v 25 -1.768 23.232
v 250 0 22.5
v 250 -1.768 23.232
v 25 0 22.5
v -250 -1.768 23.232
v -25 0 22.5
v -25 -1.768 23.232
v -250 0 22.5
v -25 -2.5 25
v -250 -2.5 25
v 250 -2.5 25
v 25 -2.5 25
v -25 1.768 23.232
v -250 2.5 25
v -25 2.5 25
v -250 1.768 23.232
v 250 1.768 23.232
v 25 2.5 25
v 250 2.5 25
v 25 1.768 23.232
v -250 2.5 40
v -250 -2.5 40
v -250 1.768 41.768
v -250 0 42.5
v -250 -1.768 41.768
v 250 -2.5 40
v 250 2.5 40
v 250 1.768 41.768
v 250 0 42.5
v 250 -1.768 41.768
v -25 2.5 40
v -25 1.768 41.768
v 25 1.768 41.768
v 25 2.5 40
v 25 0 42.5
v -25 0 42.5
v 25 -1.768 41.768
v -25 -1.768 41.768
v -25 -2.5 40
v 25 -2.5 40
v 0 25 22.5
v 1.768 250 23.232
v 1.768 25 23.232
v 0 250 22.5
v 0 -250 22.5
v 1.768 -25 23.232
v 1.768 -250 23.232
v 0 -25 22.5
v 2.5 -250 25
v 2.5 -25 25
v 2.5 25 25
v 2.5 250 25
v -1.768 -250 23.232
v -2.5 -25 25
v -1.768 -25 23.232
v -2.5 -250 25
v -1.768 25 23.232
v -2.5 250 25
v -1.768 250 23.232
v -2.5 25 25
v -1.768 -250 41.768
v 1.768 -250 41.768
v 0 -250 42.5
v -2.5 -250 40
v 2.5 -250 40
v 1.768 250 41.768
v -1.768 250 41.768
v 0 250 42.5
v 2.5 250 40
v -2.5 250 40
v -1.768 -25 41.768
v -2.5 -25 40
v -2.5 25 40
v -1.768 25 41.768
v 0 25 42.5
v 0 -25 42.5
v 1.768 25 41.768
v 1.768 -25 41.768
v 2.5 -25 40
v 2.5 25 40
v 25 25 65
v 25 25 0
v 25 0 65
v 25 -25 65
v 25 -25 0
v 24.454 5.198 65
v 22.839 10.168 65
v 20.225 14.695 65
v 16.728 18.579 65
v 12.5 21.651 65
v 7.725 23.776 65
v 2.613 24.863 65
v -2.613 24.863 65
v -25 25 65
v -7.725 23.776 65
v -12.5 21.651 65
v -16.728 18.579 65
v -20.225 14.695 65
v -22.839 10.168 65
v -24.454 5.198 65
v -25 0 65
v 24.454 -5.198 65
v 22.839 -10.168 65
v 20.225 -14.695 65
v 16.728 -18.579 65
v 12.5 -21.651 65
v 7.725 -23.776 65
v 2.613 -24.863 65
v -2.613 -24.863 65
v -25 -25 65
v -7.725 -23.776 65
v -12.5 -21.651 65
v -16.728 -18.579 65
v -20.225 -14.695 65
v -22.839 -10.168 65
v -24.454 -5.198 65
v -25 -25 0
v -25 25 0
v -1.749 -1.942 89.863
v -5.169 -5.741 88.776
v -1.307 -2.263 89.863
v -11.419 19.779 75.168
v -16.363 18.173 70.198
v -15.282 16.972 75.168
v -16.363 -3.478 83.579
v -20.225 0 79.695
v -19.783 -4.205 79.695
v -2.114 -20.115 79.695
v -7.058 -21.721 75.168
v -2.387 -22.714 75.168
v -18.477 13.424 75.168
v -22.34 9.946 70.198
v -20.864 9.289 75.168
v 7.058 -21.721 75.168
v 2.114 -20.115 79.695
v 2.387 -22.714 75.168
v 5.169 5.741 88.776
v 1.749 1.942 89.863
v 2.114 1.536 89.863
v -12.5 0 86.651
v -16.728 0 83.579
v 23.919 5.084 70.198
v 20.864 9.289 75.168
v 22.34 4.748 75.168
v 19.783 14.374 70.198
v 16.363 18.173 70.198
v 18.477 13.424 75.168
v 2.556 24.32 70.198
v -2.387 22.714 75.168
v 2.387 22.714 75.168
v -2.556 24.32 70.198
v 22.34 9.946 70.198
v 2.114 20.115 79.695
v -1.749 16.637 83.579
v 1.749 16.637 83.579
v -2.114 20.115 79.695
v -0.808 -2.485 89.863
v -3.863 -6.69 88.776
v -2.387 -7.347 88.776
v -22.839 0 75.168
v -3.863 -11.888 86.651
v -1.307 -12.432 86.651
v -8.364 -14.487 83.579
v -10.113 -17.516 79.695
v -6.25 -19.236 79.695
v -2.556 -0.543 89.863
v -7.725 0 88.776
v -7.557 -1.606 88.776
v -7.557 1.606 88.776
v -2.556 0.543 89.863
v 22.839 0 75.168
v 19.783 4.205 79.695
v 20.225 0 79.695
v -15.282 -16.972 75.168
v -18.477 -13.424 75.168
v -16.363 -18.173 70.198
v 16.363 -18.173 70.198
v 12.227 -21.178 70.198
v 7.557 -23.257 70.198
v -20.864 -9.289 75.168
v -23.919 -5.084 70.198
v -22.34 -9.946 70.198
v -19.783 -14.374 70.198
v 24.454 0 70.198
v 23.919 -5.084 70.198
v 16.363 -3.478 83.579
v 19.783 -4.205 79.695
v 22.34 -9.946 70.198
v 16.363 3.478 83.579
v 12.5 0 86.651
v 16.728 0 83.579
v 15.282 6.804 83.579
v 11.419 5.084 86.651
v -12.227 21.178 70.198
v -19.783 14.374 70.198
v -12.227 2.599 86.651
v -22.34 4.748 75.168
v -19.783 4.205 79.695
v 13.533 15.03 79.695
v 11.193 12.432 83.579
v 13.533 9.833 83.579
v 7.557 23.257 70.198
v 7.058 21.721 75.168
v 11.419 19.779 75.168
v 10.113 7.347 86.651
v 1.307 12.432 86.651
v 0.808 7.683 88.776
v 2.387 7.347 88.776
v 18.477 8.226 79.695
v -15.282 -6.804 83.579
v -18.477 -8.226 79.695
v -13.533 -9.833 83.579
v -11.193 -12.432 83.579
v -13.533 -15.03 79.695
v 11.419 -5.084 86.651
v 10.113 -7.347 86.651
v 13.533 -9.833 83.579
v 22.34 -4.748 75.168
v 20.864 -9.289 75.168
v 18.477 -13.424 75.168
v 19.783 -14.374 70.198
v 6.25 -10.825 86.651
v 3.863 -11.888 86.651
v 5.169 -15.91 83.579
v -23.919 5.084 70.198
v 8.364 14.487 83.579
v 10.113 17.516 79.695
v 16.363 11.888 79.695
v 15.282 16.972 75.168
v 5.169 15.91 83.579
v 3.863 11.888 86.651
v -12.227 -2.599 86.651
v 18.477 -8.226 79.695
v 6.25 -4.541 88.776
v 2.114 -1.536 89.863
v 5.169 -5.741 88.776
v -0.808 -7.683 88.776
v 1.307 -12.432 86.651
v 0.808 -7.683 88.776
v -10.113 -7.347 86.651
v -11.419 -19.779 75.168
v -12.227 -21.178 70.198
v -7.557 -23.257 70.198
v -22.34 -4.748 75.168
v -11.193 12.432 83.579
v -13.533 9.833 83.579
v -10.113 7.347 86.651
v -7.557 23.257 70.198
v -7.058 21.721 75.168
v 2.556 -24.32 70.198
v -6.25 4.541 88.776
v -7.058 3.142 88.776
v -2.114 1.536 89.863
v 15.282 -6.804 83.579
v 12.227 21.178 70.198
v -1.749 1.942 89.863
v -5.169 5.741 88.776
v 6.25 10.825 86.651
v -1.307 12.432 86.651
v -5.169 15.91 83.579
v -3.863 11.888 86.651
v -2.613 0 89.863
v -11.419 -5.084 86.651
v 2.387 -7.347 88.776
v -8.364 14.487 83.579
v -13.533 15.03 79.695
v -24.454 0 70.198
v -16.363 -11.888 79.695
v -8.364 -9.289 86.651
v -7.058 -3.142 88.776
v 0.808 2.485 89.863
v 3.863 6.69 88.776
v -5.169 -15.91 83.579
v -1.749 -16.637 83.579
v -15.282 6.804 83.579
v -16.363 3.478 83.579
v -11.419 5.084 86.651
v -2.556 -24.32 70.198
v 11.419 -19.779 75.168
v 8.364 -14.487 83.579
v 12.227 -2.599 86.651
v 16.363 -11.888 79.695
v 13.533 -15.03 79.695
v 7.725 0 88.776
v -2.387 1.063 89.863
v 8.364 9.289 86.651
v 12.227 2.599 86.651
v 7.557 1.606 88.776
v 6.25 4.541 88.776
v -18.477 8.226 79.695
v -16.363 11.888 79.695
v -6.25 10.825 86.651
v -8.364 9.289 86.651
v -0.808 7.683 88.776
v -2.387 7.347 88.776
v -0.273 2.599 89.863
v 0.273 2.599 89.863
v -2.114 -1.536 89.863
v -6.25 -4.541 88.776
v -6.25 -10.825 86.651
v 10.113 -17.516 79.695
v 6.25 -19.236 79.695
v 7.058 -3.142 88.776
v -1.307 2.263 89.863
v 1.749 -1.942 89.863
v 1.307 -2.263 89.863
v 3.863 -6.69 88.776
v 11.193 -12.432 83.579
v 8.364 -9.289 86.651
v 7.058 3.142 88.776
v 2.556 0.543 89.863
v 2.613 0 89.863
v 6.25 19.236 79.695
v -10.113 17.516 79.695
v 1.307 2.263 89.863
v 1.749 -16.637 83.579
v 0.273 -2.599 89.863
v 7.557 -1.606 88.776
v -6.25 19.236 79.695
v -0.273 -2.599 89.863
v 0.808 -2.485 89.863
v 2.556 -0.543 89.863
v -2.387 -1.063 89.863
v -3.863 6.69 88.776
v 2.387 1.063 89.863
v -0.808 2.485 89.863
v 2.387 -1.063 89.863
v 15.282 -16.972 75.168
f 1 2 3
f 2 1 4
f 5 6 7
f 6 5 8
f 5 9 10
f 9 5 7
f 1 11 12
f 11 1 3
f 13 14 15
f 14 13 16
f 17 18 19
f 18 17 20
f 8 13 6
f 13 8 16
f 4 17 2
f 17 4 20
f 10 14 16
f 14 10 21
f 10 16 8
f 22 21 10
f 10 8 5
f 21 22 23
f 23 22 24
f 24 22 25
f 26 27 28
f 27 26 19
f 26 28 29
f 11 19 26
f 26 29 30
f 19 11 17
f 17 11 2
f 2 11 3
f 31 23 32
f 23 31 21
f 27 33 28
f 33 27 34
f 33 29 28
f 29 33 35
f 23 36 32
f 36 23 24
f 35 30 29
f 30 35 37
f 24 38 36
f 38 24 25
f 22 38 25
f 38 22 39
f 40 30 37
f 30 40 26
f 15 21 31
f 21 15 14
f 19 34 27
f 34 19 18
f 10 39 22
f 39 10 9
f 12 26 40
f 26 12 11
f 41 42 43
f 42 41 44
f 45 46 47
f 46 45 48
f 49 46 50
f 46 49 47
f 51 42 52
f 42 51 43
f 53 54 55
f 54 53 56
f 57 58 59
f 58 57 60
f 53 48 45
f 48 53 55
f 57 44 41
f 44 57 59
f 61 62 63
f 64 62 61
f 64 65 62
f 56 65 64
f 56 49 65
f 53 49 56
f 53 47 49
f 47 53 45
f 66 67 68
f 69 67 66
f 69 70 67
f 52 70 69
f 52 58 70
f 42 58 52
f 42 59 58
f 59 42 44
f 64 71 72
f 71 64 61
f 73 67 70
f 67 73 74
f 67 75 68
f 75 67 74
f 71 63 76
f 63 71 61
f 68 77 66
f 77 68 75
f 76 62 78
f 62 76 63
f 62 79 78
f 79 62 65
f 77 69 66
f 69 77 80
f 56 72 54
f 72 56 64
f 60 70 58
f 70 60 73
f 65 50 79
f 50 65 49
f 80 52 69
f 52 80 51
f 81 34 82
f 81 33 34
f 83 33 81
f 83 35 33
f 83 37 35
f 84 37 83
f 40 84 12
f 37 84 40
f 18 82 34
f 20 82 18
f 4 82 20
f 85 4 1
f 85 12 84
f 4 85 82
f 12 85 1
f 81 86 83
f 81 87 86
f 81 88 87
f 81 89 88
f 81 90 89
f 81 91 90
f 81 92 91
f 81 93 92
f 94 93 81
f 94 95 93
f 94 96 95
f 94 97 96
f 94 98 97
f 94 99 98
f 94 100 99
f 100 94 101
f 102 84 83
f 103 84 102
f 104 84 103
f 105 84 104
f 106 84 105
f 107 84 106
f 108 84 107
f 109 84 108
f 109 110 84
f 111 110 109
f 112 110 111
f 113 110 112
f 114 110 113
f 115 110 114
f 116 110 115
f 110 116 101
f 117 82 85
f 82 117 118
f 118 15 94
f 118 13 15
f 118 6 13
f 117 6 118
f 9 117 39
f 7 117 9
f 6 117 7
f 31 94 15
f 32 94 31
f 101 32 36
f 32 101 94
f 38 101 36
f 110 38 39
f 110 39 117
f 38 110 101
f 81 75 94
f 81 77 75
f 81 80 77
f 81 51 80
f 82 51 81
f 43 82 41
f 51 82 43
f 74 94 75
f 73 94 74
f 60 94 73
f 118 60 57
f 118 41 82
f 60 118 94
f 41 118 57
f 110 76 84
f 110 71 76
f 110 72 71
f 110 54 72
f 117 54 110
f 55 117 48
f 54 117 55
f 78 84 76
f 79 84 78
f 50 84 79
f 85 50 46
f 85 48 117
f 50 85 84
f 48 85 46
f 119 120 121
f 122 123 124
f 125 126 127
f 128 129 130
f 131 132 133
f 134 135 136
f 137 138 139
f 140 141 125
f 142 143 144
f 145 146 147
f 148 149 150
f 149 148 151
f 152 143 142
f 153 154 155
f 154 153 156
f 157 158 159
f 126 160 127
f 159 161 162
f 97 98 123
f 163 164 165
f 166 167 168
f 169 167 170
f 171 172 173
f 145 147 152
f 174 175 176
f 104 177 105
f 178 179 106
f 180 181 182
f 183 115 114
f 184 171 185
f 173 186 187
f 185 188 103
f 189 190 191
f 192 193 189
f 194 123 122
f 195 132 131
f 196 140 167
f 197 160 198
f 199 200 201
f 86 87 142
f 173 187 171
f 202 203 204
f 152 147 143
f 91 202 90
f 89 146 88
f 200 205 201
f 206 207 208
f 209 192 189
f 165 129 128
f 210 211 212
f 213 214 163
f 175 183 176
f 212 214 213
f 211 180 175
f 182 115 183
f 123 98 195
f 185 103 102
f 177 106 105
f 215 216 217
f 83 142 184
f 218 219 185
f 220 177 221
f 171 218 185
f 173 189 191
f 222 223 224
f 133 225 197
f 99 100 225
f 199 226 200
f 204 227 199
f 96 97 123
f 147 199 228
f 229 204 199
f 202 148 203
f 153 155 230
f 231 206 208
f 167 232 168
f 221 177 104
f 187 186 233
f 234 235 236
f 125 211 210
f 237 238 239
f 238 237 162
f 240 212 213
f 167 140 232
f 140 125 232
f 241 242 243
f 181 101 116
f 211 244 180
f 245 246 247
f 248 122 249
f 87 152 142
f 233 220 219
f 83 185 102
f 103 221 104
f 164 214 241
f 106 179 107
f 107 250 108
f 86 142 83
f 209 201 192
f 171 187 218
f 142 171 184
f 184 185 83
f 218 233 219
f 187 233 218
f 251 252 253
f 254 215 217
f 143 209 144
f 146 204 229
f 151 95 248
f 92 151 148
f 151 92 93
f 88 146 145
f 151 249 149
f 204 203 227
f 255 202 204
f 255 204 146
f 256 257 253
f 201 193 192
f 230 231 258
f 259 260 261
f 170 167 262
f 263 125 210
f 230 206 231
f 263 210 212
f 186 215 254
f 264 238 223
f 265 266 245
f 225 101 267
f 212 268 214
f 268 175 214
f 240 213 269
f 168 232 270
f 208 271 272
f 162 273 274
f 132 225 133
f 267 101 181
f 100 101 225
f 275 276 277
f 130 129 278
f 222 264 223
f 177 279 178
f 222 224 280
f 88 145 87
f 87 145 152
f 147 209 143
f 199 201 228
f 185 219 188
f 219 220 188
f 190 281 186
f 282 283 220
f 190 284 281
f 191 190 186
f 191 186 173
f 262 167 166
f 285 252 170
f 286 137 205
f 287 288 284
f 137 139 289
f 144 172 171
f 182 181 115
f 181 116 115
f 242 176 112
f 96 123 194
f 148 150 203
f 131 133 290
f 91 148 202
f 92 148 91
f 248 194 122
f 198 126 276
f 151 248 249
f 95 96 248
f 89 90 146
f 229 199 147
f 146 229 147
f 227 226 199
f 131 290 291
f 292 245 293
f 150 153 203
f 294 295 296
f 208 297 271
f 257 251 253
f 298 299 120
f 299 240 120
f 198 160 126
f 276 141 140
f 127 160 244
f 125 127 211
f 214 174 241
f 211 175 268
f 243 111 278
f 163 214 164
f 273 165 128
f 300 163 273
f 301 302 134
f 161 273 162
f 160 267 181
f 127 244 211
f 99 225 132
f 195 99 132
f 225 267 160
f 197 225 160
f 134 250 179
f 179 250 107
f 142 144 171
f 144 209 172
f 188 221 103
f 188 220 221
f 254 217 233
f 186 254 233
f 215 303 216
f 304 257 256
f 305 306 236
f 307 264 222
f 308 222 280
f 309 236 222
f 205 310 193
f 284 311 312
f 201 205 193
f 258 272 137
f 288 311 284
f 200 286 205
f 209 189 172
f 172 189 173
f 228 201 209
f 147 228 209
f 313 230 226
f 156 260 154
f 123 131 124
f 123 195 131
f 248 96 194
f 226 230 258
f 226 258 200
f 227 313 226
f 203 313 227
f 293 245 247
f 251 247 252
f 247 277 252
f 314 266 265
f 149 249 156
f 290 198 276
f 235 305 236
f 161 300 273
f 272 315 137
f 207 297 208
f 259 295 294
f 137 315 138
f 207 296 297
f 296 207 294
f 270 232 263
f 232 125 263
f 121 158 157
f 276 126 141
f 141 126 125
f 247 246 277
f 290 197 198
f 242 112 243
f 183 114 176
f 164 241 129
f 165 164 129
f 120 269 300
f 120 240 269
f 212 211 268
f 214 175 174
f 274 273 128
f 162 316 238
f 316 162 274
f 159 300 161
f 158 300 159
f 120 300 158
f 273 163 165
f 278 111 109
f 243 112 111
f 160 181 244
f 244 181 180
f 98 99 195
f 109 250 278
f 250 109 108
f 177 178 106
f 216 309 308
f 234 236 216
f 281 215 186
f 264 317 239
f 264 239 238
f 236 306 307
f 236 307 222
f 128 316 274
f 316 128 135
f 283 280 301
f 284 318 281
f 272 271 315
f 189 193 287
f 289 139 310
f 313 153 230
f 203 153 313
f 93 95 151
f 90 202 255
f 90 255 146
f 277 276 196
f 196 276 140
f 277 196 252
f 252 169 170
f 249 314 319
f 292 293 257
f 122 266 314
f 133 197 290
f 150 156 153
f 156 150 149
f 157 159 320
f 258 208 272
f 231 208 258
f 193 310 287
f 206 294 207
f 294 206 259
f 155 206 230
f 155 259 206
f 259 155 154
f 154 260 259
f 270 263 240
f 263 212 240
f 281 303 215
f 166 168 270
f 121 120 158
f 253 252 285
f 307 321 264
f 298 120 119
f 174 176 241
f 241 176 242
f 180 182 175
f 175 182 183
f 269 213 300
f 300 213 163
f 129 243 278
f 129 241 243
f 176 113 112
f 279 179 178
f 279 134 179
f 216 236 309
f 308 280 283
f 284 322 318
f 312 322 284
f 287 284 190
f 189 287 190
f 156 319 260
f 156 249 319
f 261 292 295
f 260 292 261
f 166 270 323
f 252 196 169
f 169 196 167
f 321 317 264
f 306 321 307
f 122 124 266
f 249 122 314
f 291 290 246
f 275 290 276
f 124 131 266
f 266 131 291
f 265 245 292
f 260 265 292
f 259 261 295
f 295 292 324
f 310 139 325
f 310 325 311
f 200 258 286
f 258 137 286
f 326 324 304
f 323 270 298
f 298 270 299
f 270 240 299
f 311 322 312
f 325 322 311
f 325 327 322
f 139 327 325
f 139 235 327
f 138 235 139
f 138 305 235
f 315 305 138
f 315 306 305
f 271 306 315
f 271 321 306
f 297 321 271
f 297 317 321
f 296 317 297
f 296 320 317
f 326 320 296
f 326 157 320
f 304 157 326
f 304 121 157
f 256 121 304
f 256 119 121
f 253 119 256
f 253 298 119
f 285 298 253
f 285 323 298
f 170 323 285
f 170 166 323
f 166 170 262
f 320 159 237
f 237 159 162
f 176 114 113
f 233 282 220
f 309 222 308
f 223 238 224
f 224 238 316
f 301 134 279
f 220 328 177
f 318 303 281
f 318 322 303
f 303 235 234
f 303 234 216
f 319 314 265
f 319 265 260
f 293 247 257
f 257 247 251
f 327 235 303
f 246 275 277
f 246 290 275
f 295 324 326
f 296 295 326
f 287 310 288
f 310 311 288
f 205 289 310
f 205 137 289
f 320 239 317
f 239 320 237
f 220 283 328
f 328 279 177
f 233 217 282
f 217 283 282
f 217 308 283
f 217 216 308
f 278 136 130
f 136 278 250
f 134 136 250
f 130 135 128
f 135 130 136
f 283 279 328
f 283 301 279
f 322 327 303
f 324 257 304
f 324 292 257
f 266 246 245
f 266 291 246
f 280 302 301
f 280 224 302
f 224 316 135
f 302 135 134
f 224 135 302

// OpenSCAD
module bolt_cutout(d=5, l=15) {
    translate([250, 0, 0]) rotate([0, -90, 0]) union() {
        cylinder(d=d, h=500);
        translate([l, 0, 0]) cylinder(d=d, h=500);
        translate([0, -d/2, 0]) cube([l, d, 500]);
    }
}

module bolt_cutouts() {
    bolt_cutout();
    rotate([0, 0, 90]) bolt_cutout();
}

module void(h=65, w=50) {
    translate([-w/2, -w/2, 0]) cube([w, w, h]);
    translate([0, 0, h]) sphere(d=w);
}

module cutouts() {
    translate([0, 0, 25]) bolt_cutouts();
    void();
}

//difference() {
//    import("stl/tooth-with-base.stl");
    cutouts();
//}
